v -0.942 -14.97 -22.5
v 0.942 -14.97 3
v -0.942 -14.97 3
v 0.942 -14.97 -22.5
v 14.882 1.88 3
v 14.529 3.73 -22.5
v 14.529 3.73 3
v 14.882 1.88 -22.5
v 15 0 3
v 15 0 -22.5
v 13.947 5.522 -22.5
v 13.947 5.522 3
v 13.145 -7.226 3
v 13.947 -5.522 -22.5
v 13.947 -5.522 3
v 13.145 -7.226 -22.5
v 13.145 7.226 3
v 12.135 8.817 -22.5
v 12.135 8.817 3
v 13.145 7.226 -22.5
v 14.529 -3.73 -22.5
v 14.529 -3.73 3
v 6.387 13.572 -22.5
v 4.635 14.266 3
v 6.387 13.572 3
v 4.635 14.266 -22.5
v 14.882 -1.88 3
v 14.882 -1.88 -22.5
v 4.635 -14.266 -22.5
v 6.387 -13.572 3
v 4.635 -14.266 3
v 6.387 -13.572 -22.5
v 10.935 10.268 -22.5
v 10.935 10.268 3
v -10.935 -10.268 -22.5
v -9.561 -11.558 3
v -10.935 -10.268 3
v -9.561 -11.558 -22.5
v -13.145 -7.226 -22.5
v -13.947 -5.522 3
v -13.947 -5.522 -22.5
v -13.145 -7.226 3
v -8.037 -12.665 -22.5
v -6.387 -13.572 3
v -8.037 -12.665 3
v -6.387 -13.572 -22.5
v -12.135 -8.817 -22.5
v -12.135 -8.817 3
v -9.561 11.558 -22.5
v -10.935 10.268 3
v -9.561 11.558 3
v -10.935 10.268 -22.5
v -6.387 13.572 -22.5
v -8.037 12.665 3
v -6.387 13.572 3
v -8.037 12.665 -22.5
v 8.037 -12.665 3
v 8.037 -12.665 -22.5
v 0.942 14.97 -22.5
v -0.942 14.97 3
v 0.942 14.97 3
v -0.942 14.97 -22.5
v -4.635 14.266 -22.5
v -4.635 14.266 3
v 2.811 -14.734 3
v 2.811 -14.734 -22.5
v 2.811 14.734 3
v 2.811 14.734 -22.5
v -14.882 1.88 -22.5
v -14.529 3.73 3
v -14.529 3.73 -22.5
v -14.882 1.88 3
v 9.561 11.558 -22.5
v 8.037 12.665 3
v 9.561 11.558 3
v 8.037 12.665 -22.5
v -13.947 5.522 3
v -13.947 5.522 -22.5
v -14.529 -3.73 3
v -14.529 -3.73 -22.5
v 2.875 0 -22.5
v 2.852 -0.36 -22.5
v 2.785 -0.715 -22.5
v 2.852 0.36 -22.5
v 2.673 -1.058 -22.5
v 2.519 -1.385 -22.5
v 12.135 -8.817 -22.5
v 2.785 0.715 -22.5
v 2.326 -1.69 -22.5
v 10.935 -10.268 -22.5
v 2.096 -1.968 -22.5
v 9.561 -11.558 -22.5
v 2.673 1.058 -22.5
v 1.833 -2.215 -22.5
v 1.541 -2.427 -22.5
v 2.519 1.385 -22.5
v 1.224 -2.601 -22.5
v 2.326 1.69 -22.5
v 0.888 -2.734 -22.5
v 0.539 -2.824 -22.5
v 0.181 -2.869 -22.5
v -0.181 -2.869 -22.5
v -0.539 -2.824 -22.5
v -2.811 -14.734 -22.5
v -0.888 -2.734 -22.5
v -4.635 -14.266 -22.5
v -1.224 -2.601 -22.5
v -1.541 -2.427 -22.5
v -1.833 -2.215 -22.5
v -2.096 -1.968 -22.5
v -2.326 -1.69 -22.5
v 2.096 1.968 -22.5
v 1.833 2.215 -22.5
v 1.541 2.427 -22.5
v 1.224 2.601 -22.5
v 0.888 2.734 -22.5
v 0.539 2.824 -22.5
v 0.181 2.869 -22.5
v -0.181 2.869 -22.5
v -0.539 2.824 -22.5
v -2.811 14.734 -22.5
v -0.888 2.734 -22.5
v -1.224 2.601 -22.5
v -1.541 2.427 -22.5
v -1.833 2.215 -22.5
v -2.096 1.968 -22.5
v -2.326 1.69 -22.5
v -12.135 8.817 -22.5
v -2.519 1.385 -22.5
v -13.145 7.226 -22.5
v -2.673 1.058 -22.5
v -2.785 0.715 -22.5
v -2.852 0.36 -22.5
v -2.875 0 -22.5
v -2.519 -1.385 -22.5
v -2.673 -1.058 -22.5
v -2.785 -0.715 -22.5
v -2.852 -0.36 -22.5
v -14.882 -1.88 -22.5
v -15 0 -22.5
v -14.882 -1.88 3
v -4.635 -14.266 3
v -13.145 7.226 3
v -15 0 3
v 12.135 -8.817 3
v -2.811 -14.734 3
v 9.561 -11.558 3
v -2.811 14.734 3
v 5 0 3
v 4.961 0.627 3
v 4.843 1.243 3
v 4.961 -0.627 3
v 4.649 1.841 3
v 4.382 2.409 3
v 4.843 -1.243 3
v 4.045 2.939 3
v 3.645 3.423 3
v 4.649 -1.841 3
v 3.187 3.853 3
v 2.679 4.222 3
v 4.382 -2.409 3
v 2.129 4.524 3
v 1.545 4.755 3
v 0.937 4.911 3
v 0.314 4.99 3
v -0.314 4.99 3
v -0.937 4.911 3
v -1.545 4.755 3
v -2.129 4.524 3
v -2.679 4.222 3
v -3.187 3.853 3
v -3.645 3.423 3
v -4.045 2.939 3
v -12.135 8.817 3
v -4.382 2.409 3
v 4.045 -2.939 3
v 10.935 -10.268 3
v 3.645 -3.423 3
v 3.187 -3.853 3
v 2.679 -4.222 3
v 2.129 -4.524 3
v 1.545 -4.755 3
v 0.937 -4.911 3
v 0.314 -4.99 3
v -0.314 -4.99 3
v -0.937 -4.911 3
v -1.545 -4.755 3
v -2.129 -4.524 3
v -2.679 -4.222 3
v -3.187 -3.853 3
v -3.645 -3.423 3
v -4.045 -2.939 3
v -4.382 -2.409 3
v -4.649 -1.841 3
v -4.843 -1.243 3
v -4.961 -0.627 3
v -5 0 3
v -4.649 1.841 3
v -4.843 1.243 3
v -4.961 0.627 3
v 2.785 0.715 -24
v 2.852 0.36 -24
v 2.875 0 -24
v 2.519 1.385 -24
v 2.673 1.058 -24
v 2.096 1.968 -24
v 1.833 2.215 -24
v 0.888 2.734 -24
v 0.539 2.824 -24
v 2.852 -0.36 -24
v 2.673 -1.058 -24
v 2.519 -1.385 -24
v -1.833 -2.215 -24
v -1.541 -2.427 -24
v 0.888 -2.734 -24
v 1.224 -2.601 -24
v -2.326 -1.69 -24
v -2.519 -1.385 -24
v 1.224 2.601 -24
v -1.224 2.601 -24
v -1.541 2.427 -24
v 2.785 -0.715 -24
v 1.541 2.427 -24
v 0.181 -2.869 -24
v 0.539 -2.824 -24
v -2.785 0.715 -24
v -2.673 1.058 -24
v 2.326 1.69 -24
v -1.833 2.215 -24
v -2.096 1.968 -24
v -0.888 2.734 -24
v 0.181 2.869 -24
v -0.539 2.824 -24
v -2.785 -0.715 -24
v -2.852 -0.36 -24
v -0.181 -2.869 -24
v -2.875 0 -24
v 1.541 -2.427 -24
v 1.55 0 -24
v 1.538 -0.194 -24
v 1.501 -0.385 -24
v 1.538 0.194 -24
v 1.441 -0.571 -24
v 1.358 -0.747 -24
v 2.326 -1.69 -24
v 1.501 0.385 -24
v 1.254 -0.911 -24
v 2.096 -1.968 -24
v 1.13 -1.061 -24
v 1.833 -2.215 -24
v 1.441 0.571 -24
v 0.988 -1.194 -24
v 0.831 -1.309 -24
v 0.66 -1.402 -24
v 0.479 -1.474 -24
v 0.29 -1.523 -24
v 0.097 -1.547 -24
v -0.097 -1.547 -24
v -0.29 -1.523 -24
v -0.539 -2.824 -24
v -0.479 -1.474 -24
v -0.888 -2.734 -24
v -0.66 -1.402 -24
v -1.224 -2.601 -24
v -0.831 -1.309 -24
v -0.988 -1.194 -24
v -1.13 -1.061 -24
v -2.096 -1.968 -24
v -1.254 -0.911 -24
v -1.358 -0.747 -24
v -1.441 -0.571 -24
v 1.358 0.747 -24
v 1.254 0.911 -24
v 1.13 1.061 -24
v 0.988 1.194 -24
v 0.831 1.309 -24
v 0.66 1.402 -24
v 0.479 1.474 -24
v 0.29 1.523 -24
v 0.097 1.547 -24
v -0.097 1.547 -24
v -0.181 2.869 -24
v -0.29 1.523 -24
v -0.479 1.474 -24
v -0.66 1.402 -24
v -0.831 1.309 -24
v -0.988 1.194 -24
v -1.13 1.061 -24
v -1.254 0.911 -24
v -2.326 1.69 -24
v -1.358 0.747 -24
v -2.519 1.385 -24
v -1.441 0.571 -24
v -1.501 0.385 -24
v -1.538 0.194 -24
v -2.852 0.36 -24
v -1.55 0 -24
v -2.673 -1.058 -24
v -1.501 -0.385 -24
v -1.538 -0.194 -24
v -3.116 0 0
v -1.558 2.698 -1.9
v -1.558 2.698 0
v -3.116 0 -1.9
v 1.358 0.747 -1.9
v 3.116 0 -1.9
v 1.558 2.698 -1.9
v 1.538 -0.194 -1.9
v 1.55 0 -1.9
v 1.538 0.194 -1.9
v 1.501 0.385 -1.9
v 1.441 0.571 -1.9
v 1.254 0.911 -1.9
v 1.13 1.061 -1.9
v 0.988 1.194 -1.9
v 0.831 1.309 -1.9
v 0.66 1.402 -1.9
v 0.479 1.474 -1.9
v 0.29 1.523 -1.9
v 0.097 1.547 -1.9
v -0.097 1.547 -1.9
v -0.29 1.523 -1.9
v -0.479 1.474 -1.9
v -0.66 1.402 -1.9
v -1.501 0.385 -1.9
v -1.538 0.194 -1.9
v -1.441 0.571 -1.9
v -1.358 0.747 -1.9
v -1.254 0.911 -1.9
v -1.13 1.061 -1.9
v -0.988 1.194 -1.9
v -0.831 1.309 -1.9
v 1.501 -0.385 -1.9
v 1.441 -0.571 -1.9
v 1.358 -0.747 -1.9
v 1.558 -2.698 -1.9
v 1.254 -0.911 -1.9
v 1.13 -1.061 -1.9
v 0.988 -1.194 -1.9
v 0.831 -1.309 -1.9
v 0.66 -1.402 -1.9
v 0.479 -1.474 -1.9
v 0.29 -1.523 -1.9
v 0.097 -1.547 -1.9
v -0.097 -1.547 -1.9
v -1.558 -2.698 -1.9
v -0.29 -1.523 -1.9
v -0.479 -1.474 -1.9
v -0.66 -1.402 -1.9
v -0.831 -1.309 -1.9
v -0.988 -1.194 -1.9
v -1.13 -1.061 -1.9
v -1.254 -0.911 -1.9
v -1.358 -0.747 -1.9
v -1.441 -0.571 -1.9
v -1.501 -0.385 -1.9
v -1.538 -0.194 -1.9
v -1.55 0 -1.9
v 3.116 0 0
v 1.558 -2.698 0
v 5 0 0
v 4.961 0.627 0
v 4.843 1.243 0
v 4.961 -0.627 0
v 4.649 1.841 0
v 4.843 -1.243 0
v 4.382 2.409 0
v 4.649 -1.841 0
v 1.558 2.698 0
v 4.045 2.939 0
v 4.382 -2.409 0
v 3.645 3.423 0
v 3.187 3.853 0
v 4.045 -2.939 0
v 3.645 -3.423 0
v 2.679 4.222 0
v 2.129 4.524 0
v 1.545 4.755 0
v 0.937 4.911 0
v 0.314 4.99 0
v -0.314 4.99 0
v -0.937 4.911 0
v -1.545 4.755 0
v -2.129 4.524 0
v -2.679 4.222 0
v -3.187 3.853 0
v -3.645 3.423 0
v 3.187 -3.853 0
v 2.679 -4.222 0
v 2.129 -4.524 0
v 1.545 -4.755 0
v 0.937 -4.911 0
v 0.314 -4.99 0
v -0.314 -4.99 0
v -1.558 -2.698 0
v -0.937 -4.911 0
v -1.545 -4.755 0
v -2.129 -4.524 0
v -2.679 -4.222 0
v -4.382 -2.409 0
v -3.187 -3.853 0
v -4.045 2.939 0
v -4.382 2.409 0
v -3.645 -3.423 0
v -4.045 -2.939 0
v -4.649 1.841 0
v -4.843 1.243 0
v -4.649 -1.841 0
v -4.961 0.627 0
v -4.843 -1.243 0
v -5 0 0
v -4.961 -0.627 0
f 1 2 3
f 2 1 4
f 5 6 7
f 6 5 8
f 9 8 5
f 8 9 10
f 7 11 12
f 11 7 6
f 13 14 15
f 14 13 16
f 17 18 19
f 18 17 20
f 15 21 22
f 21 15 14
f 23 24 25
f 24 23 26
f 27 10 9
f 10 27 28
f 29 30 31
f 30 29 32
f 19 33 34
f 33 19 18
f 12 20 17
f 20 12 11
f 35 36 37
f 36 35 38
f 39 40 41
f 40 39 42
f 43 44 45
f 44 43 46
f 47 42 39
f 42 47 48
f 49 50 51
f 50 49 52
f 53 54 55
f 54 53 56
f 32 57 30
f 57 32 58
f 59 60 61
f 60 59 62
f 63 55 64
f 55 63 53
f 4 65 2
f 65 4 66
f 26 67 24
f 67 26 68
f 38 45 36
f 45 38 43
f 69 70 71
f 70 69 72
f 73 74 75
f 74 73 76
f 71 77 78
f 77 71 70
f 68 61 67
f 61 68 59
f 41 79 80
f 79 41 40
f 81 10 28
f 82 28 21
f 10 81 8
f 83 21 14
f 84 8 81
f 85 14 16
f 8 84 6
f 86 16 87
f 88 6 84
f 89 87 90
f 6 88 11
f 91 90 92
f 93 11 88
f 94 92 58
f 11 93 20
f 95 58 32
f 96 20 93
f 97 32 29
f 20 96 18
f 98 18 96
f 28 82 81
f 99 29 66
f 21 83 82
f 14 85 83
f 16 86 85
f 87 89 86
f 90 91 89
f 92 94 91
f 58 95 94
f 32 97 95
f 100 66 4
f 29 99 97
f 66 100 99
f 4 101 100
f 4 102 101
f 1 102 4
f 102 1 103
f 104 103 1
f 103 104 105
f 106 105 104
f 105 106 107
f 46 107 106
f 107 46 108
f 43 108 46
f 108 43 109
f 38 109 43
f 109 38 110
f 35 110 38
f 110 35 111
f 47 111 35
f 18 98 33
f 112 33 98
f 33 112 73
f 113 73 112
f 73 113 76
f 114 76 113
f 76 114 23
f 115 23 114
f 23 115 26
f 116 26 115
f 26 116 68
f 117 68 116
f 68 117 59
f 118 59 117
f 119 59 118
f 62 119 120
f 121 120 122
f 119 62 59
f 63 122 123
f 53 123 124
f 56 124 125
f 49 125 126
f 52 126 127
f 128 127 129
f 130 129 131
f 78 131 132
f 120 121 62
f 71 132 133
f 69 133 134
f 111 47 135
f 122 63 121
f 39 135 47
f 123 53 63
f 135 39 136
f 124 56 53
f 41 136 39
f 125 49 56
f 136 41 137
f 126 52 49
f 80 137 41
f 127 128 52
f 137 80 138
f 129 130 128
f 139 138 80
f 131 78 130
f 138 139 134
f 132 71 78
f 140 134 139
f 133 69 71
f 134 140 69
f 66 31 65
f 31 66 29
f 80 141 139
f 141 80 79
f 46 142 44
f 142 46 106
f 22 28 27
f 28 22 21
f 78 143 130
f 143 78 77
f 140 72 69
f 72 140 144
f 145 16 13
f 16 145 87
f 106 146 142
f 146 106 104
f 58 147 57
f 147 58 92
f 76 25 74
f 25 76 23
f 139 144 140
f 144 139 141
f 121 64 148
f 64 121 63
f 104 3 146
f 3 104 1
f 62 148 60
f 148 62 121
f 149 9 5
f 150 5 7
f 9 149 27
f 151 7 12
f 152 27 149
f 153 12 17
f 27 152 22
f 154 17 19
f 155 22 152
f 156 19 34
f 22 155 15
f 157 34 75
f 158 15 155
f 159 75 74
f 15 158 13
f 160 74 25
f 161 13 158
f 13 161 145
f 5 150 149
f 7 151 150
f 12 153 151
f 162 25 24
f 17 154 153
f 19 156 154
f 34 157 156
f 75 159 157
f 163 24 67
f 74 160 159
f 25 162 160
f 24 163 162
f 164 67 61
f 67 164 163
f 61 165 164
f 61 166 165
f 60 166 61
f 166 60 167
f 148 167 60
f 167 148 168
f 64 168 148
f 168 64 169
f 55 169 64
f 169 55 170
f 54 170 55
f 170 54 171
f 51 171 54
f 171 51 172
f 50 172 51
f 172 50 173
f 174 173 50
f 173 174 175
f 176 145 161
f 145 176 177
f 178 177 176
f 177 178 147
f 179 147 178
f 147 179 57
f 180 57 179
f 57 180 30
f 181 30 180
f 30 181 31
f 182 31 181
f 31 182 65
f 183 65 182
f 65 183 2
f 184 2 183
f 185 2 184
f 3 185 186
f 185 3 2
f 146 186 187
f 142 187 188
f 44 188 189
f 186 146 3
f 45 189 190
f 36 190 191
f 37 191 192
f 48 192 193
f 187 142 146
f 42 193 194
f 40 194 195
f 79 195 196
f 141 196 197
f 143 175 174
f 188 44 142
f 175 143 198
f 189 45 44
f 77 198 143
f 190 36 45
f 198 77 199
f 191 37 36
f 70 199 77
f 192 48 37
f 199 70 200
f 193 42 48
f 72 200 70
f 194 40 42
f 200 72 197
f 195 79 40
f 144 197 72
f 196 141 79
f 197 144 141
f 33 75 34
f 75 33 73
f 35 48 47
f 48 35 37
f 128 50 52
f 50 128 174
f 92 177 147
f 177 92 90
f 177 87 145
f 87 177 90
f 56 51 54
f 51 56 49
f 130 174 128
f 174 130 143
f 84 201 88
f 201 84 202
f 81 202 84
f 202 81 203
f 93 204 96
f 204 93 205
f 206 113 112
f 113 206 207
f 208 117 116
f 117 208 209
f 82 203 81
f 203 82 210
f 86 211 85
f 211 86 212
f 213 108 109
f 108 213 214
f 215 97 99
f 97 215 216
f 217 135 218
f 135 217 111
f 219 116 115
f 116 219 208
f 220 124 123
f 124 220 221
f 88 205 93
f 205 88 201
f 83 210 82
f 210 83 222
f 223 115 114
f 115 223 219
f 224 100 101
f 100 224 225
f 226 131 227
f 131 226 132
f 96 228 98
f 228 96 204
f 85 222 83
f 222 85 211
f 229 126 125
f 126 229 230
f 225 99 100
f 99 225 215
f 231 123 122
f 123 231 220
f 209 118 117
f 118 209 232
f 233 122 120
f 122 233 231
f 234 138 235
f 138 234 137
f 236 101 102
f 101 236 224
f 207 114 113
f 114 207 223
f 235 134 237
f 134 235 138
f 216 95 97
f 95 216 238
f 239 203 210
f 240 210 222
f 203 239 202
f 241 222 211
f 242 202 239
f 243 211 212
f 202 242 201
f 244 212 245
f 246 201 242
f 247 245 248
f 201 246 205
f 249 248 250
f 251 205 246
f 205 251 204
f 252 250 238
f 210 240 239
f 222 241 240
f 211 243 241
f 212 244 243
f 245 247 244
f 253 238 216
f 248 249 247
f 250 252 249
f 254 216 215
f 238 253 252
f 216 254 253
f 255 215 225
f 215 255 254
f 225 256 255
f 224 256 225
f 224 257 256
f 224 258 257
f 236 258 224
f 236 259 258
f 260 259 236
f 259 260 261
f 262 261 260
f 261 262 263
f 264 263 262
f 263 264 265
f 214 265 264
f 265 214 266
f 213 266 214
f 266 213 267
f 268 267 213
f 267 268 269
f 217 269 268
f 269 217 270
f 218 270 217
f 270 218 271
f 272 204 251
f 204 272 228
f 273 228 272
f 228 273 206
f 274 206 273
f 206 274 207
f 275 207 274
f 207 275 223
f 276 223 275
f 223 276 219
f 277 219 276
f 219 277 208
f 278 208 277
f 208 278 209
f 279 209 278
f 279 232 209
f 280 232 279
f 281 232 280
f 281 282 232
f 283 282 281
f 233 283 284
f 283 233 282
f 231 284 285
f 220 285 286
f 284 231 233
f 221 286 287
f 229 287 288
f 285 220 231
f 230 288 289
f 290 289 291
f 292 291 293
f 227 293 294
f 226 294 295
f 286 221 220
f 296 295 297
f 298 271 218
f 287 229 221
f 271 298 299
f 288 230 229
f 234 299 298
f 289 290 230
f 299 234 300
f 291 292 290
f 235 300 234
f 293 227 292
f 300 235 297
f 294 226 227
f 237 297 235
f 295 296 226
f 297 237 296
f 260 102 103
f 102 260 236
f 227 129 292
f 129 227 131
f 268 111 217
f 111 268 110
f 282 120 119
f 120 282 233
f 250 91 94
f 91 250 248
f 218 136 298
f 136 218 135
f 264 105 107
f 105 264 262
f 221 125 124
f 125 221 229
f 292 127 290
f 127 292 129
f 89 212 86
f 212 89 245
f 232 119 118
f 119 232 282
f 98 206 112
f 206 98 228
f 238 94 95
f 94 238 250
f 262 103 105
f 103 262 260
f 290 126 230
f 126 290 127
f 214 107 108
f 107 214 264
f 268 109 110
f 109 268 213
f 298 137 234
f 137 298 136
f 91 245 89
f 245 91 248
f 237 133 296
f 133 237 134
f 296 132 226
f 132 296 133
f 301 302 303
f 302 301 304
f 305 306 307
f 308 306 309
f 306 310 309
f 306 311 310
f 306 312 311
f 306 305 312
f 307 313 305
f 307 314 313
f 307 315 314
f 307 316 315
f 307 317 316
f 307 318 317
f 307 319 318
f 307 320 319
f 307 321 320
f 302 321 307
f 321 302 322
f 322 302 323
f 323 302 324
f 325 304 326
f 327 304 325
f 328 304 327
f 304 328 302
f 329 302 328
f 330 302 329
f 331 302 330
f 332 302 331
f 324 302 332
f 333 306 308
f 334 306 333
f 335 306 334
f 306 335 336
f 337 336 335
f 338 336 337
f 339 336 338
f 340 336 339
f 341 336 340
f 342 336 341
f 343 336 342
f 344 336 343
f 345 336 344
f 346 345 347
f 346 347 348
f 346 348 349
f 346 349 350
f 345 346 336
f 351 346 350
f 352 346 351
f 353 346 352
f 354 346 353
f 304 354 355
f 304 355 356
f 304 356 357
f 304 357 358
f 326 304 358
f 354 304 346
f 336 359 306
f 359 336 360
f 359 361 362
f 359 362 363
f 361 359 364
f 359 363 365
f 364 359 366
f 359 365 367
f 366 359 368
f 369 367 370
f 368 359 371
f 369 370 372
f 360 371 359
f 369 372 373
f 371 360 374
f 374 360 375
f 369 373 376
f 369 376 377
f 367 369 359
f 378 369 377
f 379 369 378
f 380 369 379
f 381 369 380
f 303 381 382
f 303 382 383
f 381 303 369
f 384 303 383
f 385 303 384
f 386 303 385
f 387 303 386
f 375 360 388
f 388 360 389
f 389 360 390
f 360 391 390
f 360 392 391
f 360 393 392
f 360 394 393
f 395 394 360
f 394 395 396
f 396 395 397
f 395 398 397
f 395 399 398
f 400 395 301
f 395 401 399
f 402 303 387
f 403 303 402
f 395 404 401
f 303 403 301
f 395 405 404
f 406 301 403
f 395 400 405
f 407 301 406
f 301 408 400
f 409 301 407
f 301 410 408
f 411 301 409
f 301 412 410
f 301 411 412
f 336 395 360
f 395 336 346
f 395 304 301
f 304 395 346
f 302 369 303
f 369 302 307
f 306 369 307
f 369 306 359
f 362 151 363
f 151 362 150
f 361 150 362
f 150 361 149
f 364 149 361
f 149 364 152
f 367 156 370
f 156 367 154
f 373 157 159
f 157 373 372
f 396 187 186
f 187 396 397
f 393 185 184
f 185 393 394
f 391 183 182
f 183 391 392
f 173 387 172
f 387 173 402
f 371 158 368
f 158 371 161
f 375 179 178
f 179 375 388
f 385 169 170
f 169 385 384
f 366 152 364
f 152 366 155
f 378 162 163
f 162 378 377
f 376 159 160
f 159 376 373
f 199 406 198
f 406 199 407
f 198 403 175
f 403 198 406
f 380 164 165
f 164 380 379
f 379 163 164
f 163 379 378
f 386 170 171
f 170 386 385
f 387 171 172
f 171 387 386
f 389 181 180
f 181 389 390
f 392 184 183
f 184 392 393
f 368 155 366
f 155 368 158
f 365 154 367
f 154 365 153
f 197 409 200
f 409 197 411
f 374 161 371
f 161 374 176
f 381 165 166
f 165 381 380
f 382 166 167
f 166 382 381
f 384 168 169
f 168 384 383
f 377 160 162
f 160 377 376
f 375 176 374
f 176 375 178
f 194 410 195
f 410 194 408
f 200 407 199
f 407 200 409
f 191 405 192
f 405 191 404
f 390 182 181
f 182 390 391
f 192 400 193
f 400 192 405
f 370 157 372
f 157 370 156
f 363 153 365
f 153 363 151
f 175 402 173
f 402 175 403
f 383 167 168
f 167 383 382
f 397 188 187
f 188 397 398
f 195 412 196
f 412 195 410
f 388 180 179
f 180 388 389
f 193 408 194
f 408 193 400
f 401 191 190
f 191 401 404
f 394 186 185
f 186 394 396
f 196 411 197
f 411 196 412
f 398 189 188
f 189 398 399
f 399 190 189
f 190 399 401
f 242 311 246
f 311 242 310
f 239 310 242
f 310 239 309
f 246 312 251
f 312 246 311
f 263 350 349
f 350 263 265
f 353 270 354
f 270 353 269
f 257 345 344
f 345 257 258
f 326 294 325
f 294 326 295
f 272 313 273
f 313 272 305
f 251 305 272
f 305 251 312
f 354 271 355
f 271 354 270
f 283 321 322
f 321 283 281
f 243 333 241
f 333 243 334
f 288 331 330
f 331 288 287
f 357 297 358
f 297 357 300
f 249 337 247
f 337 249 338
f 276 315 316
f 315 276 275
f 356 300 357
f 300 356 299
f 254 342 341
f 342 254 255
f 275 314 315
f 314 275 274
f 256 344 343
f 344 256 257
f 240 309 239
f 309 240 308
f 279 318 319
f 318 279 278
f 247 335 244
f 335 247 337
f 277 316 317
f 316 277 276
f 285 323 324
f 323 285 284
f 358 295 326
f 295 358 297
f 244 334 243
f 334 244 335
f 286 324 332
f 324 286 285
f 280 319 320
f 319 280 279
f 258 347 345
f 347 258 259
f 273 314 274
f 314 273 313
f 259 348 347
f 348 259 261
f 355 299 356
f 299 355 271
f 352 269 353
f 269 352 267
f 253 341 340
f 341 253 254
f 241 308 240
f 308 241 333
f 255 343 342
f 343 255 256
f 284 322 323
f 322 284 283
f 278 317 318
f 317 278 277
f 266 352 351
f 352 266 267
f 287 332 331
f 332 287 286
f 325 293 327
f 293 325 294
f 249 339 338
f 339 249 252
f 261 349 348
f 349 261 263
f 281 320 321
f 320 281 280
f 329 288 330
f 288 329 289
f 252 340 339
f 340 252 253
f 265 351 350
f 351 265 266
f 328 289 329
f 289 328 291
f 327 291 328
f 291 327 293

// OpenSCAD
$fn = 50;


difference() {
	union() {
		translate(v = [0, 0, -22.5000000000]) {
			cylinder(h = 25.5000000000, r = 15.0000000000);
		}
		#translate(v = [0, 0, -24.0000000000]) {
			cylinder(h = 24, r = 2.8750000000);
		}
	}
	union() {
		translate(v = [0, 0, 0]) {
			rotate(a = [0, 0, 0]) {
				difference() {
					union() {
						translate(v = [0, 0, -1.9000000000]) {
							linear_extrude(height = 1.9000000000) {
								polygon(points = [[3.1158000000, 0.0000000000], [1.5579000000, 2.6983619531], [-1.5579000000, 2.6983619531], [-3.1158000000, 0.0000000000], [-1.5579000000, -2.6983619531], [1.5579000000, -2.6983619531]]);
							}
						}
					}
					union();
				}
			}
		}
		#cylinder(h = 3, r = 5.0000000000);
		#translate(v = [0, 0, -100.0000000000]) {
			cylinder(h = 200, r = 1.5500000000);
		}
	}
}
